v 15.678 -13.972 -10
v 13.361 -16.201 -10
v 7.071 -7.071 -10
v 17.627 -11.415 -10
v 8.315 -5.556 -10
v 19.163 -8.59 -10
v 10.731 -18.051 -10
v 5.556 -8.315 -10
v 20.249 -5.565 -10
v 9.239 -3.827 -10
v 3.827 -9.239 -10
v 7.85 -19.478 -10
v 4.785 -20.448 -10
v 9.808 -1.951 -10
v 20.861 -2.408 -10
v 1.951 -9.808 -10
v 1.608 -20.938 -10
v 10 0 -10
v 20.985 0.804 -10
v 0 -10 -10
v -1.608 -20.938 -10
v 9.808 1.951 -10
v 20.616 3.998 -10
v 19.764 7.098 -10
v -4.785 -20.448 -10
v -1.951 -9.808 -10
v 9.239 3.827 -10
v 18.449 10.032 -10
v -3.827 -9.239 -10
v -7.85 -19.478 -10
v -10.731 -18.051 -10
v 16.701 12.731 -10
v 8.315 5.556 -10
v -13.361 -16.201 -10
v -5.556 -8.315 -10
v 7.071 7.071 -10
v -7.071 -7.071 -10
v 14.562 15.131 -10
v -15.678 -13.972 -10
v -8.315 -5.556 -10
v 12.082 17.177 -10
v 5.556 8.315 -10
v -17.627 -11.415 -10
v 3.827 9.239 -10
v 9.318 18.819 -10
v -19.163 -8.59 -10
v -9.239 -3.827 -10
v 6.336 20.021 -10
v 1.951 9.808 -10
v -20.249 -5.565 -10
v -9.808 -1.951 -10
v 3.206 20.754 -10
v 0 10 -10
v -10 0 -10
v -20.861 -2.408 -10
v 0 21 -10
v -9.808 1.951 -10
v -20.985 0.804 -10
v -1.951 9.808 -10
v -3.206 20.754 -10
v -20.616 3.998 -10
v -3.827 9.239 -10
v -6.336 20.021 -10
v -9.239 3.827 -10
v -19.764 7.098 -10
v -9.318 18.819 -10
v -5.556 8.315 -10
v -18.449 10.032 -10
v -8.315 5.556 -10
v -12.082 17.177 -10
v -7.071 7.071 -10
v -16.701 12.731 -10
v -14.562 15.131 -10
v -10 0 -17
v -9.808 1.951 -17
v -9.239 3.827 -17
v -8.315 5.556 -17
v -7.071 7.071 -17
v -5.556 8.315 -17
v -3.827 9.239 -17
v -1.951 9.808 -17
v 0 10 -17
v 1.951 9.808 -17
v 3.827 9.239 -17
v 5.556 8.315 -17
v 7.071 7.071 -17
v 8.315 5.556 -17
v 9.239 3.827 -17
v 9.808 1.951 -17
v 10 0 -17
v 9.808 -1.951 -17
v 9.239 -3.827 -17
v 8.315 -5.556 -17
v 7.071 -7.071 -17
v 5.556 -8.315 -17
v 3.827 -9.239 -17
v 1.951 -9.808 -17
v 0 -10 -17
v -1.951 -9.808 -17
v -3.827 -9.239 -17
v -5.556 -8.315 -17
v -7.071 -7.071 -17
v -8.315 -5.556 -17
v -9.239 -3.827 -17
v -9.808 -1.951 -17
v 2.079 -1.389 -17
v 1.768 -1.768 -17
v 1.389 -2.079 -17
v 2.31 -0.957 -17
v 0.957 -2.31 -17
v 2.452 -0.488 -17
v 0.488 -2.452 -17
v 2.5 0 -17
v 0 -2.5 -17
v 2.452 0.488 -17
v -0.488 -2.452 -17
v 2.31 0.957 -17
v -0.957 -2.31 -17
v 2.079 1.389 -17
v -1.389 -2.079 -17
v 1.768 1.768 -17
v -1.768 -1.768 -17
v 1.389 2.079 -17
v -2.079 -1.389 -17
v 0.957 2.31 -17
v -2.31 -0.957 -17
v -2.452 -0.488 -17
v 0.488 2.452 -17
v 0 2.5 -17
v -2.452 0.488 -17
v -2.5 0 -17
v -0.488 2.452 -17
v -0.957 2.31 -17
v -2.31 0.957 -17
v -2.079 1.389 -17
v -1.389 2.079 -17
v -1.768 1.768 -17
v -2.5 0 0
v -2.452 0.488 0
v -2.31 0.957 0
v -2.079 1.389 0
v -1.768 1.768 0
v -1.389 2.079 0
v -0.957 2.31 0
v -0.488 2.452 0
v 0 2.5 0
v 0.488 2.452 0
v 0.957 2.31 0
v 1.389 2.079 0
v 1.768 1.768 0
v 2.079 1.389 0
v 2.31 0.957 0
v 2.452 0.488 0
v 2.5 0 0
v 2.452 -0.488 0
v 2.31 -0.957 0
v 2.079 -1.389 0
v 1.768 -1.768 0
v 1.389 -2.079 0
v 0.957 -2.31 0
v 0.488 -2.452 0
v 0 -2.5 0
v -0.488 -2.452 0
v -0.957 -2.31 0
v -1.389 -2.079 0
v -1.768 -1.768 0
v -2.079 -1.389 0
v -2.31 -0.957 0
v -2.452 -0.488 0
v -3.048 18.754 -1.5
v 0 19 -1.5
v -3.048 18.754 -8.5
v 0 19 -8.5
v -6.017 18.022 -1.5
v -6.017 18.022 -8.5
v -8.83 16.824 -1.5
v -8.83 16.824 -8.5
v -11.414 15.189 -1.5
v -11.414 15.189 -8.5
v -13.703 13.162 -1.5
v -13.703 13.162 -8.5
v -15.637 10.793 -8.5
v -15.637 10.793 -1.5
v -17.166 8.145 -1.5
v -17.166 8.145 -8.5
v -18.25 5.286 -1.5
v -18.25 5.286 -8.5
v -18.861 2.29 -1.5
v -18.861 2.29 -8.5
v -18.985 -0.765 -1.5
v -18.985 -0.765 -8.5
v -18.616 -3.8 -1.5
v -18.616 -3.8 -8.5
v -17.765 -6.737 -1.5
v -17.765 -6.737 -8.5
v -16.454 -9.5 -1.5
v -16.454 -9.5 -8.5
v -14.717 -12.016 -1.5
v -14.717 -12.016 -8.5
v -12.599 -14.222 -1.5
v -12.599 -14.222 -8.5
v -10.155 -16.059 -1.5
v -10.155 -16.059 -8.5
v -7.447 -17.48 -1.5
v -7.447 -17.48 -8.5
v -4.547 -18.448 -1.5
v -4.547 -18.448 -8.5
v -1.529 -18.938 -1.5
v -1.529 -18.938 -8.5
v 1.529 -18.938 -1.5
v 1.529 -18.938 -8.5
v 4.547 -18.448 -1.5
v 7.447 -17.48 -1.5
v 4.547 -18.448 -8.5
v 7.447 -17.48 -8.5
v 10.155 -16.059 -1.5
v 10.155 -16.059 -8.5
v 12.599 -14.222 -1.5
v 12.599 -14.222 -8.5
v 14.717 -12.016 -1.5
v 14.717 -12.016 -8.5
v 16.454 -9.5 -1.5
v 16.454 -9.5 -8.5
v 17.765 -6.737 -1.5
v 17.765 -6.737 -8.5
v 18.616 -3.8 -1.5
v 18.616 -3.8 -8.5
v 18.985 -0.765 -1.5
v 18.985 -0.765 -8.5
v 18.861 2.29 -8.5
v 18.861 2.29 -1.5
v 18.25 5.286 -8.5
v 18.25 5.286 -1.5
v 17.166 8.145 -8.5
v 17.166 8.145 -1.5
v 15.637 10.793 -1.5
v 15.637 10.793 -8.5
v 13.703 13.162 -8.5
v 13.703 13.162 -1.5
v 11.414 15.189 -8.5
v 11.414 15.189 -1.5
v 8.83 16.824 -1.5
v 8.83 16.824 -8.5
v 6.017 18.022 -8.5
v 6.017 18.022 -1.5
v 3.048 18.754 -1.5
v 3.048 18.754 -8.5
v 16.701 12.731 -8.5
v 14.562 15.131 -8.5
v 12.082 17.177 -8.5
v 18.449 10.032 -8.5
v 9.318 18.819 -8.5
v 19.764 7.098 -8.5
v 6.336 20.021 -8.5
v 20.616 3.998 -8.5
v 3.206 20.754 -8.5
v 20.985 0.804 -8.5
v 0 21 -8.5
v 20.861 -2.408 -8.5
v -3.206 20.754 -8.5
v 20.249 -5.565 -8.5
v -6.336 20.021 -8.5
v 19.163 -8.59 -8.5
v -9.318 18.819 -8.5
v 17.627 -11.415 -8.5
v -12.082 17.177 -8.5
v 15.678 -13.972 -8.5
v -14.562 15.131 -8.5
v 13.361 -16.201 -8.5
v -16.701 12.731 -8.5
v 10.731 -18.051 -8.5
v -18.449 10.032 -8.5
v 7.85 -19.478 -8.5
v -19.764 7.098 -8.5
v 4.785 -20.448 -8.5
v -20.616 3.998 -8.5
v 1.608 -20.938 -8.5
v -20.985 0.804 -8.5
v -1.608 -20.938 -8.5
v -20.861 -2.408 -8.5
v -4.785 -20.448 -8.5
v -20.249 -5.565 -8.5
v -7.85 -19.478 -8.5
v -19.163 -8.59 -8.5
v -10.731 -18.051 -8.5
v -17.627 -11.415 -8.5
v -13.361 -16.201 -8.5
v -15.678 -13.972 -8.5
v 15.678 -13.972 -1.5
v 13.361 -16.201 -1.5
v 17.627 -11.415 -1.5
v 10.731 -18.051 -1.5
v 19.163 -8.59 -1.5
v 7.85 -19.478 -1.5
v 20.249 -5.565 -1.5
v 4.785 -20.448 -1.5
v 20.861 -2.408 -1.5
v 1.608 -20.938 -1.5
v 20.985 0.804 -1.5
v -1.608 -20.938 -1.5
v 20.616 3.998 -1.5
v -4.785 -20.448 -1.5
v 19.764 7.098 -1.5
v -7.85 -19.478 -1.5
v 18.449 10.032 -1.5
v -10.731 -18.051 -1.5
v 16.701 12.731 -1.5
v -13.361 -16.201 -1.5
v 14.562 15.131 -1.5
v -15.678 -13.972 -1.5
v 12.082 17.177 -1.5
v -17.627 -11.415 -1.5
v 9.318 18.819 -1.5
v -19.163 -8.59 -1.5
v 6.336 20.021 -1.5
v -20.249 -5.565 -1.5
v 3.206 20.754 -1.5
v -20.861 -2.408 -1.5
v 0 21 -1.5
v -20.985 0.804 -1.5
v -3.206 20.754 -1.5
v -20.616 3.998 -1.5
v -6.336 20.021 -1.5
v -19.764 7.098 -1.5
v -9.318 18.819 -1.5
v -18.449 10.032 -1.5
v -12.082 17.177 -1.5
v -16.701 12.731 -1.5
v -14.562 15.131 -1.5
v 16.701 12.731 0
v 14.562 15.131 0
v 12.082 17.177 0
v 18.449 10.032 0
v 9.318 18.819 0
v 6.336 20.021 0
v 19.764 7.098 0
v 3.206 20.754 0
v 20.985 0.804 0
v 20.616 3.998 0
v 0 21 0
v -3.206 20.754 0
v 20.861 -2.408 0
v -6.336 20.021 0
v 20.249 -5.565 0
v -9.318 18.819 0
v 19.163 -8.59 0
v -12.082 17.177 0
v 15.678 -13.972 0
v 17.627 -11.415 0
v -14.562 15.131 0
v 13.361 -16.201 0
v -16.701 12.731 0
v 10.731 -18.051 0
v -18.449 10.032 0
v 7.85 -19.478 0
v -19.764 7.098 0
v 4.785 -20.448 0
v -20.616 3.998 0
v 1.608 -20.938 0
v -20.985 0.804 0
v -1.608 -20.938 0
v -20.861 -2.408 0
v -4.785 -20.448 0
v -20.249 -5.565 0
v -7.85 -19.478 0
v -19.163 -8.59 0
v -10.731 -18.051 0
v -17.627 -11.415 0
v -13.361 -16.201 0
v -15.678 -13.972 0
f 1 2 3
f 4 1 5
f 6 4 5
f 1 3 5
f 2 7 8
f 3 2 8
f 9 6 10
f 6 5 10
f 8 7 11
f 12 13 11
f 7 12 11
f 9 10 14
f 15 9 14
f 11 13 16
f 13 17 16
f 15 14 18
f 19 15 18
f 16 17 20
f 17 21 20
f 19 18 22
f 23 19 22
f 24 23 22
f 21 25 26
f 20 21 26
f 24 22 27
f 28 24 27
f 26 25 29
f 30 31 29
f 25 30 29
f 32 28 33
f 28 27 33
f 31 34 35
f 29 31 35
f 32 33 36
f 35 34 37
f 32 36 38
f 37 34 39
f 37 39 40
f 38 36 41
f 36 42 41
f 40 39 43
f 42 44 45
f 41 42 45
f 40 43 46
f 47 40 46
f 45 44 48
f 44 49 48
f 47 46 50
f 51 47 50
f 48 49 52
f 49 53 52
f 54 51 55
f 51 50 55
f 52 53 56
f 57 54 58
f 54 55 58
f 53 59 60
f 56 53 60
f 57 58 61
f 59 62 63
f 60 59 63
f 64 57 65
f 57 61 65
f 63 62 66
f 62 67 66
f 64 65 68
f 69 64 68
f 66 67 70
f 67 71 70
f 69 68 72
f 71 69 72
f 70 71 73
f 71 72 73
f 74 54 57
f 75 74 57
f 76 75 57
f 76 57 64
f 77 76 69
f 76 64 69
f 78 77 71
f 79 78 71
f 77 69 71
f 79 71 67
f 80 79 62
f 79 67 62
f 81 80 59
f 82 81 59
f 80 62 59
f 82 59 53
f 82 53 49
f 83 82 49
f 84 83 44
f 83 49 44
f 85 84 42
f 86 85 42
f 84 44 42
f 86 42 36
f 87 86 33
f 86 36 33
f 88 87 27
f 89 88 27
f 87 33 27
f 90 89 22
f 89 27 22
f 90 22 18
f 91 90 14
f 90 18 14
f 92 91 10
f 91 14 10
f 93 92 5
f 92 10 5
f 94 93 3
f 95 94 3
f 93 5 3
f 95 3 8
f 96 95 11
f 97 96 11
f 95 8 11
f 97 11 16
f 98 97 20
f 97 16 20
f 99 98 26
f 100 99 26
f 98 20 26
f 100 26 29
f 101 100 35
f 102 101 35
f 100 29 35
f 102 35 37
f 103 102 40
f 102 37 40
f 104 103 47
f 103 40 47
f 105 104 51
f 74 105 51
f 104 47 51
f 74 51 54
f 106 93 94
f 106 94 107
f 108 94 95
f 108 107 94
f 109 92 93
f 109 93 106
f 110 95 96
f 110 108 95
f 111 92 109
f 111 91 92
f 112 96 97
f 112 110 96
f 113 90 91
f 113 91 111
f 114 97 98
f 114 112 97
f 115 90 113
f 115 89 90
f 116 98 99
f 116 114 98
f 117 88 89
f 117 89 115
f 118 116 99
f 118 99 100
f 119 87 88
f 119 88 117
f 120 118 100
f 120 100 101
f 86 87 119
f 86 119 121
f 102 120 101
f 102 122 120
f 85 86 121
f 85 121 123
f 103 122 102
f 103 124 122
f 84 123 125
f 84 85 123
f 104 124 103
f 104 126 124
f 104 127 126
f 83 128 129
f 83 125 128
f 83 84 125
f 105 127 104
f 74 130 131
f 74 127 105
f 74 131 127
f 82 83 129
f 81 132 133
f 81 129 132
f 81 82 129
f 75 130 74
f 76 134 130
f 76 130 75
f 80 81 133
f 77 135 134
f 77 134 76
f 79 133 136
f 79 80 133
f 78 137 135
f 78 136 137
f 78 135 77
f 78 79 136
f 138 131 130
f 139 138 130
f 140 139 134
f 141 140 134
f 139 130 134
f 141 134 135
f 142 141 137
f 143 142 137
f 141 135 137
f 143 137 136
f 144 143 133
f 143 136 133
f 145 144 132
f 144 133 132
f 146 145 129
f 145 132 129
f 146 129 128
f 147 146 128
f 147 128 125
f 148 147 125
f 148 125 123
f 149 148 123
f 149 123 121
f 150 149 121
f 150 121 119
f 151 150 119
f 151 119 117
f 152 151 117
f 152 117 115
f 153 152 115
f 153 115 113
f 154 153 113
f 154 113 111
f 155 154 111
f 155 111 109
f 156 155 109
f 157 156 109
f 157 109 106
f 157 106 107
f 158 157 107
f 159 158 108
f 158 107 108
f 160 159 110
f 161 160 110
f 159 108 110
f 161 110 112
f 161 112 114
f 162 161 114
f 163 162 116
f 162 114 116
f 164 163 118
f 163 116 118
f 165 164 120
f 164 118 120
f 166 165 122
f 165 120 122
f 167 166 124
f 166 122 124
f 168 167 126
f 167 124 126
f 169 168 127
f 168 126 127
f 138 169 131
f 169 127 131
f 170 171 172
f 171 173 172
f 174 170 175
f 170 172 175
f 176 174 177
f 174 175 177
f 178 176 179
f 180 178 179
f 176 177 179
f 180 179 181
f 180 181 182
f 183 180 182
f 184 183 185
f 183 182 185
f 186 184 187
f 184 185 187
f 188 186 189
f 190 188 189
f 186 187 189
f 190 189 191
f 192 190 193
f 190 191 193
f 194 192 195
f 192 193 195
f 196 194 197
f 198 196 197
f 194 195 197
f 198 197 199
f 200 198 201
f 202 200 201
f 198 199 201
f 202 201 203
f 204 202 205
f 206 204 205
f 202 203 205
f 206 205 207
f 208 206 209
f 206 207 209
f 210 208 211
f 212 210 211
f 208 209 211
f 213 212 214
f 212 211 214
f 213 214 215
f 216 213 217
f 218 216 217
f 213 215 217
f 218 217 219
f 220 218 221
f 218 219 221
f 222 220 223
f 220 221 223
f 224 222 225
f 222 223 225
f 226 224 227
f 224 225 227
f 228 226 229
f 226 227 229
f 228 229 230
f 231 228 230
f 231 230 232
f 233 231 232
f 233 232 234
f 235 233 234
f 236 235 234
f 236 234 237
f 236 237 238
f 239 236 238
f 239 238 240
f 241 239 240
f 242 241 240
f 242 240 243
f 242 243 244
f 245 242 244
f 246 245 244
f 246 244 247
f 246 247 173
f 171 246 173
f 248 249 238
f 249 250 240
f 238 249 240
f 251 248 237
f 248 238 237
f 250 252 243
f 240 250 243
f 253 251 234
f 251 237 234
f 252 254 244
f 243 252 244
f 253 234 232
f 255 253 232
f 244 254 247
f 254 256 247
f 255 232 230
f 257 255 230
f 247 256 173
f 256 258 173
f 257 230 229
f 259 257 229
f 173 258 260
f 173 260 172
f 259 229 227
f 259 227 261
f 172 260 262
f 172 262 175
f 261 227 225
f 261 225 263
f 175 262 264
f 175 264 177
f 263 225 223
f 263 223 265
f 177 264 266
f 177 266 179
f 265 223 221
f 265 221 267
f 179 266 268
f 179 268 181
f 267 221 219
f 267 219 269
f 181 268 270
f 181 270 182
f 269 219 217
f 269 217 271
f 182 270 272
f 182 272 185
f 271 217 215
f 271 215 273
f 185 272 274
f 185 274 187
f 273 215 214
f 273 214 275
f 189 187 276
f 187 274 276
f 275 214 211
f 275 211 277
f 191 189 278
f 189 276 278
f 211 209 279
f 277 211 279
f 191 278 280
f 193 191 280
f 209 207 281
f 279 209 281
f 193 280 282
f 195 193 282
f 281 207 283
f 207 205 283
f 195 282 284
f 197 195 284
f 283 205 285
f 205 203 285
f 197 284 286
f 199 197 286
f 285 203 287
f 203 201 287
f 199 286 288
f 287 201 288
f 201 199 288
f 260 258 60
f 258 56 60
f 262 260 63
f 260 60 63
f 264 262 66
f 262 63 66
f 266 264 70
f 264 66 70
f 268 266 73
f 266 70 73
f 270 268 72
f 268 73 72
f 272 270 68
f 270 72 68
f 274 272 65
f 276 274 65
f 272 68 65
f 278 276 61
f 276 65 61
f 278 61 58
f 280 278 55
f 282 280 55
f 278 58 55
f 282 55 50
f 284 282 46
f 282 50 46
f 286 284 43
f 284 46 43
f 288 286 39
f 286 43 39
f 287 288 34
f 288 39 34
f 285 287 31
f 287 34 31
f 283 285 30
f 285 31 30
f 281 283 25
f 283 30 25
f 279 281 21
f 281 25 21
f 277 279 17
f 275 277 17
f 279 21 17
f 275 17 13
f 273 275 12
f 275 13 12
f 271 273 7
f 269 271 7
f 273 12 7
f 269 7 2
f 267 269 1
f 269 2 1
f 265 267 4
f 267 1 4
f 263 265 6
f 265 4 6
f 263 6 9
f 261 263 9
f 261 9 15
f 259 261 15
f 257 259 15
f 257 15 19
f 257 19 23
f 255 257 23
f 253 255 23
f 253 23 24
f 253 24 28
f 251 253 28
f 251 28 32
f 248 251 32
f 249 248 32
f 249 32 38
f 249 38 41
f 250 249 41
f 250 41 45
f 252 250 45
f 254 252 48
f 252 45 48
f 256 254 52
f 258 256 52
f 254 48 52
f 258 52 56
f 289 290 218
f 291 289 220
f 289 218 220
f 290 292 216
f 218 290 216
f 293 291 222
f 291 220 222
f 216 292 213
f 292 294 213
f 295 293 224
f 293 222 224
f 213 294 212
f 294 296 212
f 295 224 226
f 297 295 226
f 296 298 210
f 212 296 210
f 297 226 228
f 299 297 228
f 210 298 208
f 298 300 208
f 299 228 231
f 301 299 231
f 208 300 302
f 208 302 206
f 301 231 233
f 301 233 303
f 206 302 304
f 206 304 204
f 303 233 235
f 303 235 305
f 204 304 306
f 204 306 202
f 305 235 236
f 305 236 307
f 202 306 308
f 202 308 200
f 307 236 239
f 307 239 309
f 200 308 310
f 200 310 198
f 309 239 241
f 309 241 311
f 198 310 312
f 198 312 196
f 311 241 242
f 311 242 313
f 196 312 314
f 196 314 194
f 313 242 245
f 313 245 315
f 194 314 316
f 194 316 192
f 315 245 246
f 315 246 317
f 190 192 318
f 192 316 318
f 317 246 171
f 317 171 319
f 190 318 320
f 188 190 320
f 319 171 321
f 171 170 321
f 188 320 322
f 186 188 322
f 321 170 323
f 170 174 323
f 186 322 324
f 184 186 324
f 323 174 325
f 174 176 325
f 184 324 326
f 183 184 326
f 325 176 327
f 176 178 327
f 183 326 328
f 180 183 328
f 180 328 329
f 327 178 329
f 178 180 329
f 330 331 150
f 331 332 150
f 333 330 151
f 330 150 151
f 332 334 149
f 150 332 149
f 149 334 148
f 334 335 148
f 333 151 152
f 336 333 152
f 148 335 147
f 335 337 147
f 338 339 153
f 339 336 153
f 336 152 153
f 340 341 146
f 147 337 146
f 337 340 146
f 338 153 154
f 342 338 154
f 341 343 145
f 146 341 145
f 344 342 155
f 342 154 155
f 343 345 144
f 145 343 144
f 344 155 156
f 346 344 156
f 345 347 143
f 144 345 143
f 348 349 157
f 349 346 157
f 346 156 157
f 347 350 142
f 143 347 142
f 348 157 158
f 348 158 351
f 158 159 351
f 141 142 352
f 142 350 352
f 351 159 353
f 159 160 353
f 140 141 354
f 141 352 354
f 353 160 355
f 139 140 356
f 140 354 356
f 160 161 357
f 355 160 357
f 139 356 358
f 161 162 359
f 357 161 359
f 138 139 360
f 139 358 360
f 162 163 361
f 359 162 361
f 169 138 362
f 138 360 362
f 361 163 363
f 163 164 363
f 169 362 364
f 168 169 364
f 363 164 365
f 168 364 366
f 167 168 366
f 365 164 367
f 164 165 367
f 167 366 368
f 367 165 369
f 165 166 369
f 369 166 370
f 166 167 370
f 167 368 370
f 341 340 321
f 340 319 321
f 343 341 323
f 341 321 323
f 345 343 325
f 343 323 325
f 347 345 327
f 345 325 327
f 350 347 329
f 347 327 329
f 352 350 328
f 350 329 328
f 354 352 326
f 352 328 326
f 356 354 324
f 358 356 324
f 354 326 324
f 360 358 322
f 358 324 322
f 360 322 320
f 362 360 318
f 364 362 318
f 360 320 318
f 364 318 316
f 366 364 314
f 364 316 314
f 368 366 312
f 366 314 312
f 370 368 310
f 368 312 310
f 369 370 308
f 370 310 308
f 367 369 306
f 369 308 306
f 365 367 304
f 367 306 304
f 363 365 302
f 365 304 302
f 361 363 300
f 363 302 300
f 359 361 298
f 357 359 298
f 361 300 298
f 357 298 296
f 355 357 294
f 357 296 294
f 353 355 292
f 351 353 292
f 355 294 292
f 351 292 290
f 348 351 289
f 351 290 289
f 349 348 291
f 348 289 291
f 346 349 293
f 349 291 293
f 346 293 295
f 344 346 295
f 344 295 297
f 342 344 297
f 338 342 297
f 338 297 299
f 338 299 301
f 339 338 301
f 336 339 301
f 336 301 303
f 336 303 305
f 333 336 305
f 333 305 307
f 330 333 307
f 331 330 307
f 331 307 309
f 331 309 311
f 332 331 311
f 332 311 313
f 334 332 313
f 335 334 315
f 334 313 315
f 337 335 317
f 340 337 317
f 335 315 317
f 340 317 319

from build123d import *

# Parameters (mm, degrees)
SKETCH_3_R          = 10
EXTRUDE_1_DEPTH     = 7
SKETCH_4_R          = 2.5
CUT_EXTRUDE_1_DEPTH = 18


with BuildPart() as part:
    # Эскиз2 → Повернуть1 (revolve)
    with BuildSketch(Plane(origin=(0, 0, 0), x_dir=(0, 0, -1), z_dir=(1, 0, 0))):
        Polygon((0, 0), (0, 21), (1.5, 21), (1.5, 19), (8.5, 19), (8.5, 21), (10, 21), (10, 0), align=None)
    revolve(axis=Axis((0, 0, -10), (0, 0, 1)))

    # Эскиз3 → Бобышка-Вытянуть1 (add)
    with BuildSketch(Plane(origin=(0, 0, -10), x_dir=(-1, 0, 0), z_dir=(0, 0, -1))):
        Circle(SKETCH_3_R)
    extrude(amount=EXTRUDE_1_DEPTH)

    # Эскиз4 → Вырез-Вытянуть1 (cut, through all)
    with BuildSketch(Plane(origin=(0, 0, -17), x_dir=(-1, 0, 0), z_dir=(0, 0, -1))):
        Circle(SKETCH_4_R)
    extrude(amount=-CUT_EXTRUDE_1_DEPTH, mode=Mode.SUBTRACT)


solid = part.part
